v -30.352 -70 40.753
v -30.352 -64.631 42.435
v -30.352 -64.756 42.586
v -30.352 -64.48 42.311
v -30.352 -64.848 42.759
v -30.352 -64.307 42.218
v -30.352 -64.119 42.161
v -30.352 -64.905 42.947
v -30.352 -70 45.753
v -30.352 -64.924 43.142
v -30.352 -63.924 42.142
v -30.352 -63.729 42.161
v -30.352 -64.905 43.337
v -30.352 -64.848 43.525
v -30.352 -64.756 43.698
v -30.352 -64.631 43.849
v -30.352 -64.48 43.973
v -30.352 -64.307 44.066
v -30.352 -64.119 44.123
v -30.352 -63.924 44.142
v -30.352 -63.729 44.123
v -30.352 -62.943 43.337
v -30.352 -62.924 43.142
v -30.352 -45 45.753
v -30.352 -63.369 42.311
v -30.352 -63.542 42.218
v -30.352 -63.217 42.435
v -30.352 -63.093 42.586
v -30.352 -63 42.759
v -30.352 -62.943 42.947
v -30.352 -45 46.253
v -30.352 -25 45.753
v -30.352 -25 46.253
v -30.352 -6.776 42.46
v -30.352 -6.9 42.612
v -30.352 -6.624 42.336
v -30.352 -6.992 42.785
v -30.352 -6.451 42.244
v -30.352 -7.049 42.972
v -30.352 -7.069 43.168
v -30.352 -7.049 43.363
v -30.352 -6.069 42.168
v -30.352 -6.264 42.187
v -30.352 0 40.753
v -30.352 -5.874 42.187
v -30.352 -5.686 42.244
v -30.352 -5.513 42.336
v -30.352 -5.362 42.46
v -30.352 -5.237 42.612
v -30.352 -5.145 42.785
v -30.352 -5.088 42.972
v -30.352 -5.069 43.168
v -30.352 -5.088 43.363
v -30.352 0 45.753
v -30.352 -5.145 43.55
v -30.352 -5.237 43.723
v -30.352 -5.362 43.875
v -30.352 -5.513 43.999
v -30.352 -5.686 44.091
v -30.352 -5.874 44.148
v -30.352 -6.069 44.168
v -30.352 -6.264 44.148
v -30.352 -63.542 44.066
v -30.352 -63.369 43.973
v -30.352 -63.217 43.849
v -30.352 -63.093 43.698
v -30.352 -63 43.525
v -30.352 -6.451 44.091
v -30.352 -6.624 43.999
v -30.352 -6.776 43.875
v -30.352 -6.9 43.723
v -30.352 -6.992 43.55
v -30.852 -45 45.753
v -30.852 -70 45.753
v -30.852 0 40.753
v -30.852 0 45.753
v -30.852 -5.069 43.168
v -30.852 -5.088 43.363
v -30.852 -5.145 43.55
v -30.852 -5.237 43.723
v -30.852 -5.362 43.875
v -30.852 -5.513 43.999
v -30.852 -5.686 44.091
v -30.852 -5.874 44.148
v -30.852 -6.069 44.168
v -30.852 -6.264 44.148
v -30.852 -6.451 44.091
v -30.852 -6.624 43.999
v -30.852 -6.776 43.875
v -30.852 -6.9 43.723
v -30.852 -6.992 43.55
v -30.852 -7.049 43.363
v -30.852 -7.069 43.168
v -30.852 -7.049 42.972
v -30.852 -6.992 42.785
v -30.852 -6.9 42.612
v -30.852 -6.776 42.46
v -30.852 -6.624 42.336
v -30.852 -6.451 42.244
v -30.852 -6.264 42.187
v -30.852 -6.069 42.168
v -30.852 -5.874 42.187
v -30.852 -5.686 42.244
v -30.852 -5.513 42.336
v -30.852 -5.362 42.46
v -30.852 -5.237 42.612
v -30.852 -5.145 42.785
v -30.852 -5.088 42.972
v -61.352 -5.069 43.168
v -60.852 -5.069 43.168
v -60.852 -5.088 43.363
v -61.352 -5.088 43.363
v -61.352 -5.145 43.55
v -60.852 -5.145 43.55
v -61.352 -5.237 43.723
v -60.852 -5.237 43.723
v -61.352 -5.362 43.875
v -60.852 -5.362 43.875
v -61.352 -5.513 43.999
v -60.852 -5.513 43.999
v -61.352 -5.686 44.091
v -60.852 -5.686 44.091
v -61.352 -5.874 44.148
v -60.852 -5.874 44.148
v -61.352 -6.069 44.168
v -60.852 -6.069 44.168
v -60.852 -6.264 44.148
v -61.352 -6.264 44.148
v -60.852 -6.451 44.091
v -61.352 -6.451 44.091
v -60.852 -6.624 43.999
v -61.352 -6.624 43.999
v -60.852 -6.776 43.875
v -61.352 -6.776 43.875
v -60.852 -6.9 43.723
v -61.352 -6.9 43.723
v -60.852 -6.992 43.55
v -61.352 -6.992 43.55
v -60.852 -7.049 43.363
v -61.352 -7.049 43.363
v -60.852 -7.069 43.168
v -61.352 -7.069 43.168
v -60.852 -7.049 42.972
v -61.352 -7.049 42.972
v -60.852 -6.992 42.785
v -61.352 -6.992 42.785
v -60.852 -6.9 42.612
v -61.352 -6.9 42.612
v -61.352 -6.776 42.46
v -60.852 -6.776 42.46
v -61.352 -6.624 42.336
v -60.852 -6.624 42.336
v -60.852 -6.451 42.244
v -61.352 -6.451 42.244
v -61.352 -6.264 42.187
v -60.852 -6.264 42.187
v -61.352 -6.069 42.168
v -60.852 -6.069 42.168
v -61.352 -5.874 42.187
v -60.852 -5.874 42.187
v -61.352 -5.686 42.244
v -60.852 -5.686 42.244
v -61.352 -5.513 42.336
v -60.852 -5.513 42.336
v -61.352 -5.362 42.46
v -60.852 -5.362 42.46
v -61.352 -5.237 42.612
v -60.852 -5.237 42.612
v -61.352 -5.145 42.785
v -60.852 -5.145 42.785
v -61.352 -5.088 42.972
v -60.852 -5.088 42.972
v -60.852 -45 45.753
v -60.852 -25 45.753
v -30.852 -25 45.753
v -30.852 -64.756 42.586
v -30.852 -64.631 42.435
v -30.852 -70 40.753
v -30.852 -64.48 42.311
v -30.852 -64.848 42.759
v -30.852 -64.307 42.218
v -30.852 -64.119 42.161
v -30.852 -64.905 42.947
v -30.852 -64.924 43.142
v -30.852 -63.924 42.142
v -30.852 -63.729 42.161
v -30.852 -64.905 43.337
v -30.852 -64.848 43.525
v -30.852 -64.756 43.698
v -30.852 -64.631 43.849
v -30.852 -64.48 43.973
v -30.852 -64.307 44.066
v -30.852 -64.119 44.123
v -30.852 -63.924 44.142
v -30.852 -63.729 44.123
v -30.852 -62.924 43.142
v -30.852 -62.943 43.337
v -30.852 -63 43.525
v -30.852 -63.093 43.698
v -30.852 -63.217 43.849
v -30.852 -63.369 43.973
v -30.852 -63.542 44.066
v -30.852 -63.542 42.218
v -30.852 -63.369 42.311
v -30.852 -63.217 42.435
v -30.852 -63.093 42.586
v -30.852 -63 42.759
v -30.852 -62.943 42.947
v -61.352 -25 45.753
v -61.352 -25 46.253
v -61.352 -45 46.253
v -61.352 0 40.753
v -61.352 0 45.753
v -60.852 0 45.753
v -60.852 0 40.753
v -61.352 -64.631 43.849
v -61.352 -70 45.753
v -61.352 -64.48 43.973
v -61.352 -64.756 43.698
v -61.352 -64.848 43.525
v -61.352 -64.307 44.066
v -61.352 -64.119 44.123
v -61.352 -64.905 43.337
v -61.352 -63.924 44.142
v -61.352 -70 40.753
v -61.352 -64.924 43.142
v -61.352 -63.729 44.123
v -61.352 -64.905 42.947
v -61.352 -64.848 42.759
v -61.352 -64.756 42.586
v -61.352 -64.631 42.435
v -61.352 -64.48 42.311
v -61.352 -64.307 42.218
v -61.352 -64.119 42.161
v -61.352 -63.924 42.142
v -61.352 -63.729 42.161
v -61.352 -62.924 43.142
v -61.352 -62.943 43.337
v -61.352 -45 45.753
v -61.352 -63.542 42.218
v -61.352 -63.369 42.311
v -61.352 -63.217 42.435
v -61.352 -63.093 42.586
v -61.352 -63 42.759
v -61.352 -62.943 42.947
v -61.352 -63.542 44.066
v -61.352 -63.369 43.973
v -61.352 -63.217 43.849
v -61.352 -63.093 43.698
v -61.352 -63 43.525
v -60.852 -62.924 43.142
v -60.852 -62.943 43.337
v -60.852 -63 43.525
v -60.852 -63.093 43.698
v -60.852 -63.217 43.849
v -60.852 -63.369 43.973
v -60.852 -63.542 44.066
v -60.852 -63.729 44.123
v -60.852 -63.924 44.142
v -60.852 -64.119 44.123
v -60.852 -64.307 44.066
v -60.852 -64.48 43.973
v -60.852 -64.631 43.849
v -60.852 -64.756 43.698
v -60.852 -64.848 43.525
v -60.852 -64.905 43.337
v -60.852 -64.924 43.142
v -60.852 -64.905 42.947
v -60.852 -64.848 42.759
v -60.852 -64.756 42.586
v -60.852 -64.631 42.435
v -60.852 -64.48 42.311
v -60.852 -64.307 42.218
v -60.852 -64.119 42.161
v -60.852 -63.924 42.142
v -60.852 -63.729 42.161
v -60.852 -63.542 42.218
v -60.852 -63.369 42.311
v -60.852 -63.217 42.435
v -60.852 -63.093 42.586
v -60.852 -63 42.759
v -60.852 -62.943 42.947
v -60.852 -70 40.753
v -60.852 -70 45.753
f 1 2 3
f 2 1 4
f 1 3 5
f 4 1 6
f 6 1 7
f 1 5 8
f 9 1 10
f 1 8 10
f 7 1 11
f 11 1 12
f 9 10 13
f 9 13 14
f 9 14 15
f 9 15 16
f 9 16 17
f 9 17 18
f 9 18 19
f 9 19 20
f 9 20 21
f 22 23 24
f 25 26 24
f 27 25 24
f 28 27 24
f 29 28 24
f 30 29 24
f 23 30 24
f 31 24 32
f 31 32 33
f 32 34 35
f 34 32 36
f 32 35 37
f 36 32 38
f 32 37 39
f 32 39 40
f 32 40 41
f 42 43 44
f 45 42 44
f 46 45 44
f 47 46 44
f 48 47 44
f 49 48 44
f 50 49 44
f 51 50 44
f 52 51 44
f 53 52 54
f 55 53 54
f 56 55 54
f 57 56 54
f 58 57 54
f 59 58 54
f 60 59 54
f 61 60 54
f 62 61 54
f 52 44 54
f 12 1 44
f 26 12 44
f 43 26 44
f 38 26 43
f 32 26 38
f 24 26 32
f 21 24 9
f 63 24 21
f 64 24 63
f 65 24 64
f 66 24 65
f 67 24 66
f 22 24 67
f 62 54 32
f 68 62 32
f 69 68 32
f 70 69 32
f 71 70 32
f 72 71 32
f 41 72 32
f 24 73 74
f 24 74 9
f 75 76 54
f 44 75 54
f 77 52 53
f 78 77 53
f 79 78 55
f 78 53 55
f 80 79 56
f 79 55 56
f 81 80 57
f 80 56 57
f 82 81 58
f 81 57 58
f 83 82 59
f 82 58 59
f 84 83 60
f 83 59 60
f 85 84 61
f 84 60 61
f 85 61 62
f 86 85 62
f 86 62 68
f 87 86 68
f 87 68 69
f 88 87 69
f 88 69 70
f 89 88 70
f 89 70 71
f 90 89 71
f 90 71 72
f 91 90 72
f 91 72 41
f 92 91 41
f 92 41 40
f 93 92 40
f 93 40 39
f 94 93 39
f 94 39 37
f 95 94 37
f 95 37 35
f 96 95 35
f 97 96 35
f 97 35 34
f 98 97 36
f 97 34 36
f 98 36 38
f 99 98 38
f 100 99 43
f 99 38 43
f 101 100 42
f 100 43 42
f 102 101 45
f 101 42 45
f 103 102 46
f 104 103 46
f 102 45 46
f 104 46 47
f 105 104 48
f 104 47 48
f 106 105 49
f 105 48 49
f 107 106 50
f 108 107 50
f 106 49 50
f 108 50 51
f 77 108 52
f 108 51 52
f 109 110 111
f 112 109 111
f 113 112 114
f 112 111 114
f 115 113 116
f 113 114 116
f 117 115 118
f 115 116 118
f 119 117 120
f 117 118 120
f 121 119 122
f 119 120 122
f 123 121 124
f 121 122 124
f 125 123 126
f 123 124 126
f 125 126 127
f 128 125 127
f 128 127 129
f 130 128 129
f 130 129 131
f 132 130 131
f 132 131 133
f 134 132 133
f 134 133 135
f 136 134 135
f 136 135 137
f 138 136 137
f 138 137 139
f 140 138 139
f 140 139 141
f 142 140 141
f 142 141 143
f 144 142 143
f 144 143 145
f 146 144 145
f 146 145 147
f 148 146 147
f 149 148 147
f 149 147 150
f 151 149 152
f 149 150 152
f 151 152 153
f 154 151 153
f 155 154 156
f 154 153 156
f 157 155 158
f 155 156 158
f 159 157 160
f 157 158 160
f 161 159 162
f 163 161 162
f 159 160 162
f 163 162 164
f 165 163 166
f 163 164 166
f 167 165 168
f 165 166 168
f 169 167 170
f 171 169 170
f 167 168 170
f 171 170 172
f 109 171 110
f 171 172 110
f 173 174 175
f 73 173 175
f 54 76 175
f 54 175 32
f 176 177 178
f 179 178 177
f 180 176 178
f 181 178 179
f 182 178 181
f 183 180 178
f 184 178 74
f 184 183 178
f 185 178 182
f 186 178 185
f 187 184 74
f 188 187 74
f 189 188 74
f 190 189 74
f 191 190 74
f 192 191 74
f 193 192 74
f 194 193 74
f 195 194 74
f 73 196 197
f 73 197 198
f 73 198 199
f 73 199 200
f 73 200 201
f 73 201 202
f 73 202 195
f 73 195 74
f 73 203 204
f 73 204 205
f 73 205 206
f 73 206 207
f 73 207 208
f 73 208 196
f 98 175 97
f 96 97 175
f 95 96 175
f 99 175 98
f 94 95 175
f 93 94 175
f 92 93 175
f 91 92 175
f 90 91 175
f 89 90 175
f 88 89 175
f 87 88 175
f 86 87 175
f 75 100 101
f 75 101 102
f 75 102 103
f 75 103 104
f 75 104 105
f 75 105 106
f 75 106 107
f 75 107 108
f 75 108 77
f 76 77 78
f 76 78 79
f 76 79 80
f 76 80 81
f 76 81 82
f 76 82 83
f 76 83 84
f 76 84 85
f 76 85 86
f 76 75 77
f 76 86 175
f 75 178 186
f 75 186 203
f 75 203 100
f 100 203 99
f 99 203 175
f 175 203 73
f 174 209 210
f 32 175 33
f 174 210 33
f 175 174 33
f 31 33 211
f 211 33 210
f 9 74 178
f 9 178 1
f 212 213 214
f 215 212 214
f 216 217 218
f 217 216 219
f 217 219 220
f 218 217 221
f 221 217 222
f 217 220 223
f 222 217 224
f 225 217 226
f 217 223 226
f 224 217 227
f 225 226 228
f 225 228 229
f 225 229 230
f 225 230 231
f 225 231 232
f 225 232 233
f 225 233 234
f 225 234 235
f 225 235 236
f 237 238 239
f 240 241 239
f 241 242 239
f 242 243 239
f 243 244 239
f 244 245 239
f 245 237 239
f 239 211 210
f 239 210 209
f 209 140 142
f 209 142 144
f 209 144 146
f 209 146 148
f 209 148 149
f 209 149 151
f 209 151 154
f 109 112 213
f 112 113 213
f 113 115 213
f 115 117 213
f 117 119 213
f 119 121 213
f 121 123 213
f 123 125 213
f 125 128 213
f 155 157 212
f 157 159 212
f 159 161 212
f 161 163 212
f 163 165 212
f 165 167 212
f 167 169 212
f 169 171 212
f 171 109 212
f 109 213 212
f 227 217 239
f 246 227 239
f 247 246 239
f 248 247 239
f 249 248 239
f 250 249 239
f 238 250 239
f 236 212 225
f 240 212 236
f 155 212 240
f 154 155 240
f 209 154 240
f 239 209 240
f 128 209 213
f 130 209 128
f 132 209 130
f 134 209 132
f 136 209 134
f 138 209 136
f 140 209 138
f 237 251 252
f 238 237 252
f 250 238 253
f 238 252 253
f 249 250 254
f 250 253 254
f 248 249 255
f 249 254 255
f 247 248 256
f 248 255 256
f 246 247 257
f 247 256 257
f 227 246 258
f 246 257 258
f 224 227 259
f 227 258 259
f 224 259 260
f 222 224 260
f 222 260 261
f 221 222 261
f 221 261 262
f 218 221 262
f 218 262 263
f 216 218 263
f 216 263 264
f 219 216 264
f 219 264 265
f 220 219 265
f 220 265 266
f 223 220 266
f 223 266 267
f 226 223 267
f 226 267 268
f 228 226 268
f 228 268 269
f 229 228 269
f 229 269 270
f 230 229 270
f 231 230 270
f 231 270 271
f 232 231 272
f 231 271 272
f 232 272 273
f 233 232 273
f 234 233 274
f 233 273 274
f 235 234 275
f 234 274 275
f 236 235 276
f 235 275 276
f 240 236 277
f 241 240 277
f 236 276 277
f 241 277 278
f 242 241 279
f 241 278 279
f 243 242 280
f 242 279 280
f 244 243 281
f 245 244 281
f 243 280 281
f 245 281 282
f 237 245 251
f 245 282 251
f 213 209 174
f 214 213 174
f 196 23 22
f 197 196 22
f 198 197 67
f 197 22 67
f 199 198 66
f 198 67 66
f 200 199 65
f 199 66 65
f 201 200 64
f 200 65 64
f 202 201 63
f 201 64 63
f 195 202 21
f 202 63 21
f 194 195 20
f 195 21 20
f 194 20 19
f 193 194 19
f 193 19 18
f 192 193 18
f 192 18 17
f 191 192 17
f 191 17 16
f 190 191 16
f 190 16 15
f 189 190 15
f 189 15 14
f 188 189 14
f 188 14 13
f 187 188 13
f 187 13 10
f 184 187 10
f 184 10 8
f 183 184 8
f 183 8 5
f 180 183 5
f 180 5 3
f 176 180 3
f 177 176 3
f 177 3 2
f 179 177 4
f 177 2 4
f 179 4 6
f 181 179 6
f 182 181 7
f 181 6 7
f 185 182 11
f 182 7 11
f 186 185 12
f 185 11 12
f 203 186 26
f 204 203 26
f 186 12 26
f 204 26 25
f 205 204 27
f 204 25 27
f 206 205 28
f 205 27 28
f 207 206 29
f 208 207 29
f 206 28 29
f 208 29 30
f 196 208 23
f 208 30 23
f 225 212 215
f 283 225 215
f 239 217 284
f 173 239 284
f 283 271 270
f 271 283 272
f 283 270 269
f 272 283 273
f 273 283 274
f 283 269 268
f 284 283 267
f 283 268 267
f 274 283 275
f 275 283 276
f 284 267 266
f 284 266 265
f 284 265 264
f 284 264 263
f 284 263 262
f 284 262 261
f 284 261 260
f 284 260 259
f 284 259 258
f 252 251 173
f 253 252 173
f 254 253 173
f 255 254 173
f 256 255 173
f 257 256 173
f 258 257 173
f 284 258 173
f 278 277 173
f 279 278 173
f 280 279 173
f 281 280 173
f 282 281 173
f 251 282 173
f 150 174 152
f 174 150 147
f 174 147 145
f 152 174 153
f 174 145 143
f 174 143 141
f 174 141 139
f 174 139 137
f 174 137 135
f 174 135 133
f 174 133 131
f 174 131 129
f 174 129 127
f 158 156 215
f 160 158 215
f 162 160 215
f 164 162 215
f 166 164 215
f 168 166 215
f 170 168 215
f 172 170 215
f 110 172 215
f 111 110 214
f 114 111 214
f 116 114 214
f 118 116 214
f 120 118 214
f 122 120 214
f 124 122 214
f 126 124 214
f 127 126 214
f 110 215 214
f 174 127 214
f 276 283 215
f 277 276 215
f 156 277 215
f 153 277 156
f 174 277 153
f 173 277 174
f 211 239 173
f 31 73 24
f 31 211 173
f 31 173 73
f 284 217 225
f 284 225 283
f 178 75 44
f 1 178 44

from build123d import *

# Parameters (mm, degrees)
F0_W     = 0.5
F0_H     = 5
F1_DEPTH = 70
F2_DEPTH = 25
F3_START = 45
F3_DEPTH = 25
F4_R     = 1
F5_DEPTH = 84.25
F6_R     = 1
F7_DEPTH = 160.25


with BuildPart() as f1:
    # F0 (on Front) → F1 (new body)
    with BuildSketch(Plane.XZ):
        with Locations((-61.1022742987, 43.2528425008)):
            Rectangle(F0_W, F0_H)
        Polygon((-61.3522742987, 45.7528425008), (-60.8522742987, 45.7528425008), (-30.8522742987, 45.7528425008), (-30.3522742987, 45.7528425008), (-30.3522742987, 46.2528425008), (-61.3522742987, 46.2528425008), align=None)
        with Locations((-30.6022742987, 43.2528425008)):
            Rectangle(F0_W, F0_H)
    extrude(amount=F1_DEPTH)

    # F0 (on Front) → F2 (cut)
    with BuildSketch(Plane.XZ):
        Polygon((-61.3522742987, 45.7528425008), (-60.8522742987, 45.7528425008), (-30.8522742987, 45.7528425008), (-30.3522742987, 45.7528425008), (-30.3522742987, 46.2528425008), (-61.3522742987, 46.2528425008), align=None)
    extrude(amount=F2_DEPTH, mode=Mode.SUBTRACT)

    # F0 (on Front) → F3 (cut)
    with BuildSketch(Plane.XZ.offset(F3_START)):
        Polygon((-61.3522742987, 45.7528425008), (-60.8522742987, 45.7528425008), (-30.8522742987, 45.7528425008), (-30.3522742987, 45.7528425008), (-30.3522742987, 46.2528425008), (-61.3522742987, 46.2528425008), align=None)
    extrude(amount=F3_DEPTH, mode=Mode.SUBTRACT)

    # F4 (on Right) → F5 (cut)
    with BuildSketch(Plane.YZ):
        with Locations((-63.924215734, 43.1419759989)):
            Circle(F4_R)
    extrude(amount=-F5_DEPTH, mode=Mode.SUBTRACT)

    # F6 (on Right) → F7 (cut)
    with BuildSketch(Plane.YZ):
        with Locations((-6.0686194338, 43.1675091386)):
            Circle(F6_R)
    extrude(amount=-F7_DEPTH, mode=Mode.SUBTRACT)


solid = f1.part
